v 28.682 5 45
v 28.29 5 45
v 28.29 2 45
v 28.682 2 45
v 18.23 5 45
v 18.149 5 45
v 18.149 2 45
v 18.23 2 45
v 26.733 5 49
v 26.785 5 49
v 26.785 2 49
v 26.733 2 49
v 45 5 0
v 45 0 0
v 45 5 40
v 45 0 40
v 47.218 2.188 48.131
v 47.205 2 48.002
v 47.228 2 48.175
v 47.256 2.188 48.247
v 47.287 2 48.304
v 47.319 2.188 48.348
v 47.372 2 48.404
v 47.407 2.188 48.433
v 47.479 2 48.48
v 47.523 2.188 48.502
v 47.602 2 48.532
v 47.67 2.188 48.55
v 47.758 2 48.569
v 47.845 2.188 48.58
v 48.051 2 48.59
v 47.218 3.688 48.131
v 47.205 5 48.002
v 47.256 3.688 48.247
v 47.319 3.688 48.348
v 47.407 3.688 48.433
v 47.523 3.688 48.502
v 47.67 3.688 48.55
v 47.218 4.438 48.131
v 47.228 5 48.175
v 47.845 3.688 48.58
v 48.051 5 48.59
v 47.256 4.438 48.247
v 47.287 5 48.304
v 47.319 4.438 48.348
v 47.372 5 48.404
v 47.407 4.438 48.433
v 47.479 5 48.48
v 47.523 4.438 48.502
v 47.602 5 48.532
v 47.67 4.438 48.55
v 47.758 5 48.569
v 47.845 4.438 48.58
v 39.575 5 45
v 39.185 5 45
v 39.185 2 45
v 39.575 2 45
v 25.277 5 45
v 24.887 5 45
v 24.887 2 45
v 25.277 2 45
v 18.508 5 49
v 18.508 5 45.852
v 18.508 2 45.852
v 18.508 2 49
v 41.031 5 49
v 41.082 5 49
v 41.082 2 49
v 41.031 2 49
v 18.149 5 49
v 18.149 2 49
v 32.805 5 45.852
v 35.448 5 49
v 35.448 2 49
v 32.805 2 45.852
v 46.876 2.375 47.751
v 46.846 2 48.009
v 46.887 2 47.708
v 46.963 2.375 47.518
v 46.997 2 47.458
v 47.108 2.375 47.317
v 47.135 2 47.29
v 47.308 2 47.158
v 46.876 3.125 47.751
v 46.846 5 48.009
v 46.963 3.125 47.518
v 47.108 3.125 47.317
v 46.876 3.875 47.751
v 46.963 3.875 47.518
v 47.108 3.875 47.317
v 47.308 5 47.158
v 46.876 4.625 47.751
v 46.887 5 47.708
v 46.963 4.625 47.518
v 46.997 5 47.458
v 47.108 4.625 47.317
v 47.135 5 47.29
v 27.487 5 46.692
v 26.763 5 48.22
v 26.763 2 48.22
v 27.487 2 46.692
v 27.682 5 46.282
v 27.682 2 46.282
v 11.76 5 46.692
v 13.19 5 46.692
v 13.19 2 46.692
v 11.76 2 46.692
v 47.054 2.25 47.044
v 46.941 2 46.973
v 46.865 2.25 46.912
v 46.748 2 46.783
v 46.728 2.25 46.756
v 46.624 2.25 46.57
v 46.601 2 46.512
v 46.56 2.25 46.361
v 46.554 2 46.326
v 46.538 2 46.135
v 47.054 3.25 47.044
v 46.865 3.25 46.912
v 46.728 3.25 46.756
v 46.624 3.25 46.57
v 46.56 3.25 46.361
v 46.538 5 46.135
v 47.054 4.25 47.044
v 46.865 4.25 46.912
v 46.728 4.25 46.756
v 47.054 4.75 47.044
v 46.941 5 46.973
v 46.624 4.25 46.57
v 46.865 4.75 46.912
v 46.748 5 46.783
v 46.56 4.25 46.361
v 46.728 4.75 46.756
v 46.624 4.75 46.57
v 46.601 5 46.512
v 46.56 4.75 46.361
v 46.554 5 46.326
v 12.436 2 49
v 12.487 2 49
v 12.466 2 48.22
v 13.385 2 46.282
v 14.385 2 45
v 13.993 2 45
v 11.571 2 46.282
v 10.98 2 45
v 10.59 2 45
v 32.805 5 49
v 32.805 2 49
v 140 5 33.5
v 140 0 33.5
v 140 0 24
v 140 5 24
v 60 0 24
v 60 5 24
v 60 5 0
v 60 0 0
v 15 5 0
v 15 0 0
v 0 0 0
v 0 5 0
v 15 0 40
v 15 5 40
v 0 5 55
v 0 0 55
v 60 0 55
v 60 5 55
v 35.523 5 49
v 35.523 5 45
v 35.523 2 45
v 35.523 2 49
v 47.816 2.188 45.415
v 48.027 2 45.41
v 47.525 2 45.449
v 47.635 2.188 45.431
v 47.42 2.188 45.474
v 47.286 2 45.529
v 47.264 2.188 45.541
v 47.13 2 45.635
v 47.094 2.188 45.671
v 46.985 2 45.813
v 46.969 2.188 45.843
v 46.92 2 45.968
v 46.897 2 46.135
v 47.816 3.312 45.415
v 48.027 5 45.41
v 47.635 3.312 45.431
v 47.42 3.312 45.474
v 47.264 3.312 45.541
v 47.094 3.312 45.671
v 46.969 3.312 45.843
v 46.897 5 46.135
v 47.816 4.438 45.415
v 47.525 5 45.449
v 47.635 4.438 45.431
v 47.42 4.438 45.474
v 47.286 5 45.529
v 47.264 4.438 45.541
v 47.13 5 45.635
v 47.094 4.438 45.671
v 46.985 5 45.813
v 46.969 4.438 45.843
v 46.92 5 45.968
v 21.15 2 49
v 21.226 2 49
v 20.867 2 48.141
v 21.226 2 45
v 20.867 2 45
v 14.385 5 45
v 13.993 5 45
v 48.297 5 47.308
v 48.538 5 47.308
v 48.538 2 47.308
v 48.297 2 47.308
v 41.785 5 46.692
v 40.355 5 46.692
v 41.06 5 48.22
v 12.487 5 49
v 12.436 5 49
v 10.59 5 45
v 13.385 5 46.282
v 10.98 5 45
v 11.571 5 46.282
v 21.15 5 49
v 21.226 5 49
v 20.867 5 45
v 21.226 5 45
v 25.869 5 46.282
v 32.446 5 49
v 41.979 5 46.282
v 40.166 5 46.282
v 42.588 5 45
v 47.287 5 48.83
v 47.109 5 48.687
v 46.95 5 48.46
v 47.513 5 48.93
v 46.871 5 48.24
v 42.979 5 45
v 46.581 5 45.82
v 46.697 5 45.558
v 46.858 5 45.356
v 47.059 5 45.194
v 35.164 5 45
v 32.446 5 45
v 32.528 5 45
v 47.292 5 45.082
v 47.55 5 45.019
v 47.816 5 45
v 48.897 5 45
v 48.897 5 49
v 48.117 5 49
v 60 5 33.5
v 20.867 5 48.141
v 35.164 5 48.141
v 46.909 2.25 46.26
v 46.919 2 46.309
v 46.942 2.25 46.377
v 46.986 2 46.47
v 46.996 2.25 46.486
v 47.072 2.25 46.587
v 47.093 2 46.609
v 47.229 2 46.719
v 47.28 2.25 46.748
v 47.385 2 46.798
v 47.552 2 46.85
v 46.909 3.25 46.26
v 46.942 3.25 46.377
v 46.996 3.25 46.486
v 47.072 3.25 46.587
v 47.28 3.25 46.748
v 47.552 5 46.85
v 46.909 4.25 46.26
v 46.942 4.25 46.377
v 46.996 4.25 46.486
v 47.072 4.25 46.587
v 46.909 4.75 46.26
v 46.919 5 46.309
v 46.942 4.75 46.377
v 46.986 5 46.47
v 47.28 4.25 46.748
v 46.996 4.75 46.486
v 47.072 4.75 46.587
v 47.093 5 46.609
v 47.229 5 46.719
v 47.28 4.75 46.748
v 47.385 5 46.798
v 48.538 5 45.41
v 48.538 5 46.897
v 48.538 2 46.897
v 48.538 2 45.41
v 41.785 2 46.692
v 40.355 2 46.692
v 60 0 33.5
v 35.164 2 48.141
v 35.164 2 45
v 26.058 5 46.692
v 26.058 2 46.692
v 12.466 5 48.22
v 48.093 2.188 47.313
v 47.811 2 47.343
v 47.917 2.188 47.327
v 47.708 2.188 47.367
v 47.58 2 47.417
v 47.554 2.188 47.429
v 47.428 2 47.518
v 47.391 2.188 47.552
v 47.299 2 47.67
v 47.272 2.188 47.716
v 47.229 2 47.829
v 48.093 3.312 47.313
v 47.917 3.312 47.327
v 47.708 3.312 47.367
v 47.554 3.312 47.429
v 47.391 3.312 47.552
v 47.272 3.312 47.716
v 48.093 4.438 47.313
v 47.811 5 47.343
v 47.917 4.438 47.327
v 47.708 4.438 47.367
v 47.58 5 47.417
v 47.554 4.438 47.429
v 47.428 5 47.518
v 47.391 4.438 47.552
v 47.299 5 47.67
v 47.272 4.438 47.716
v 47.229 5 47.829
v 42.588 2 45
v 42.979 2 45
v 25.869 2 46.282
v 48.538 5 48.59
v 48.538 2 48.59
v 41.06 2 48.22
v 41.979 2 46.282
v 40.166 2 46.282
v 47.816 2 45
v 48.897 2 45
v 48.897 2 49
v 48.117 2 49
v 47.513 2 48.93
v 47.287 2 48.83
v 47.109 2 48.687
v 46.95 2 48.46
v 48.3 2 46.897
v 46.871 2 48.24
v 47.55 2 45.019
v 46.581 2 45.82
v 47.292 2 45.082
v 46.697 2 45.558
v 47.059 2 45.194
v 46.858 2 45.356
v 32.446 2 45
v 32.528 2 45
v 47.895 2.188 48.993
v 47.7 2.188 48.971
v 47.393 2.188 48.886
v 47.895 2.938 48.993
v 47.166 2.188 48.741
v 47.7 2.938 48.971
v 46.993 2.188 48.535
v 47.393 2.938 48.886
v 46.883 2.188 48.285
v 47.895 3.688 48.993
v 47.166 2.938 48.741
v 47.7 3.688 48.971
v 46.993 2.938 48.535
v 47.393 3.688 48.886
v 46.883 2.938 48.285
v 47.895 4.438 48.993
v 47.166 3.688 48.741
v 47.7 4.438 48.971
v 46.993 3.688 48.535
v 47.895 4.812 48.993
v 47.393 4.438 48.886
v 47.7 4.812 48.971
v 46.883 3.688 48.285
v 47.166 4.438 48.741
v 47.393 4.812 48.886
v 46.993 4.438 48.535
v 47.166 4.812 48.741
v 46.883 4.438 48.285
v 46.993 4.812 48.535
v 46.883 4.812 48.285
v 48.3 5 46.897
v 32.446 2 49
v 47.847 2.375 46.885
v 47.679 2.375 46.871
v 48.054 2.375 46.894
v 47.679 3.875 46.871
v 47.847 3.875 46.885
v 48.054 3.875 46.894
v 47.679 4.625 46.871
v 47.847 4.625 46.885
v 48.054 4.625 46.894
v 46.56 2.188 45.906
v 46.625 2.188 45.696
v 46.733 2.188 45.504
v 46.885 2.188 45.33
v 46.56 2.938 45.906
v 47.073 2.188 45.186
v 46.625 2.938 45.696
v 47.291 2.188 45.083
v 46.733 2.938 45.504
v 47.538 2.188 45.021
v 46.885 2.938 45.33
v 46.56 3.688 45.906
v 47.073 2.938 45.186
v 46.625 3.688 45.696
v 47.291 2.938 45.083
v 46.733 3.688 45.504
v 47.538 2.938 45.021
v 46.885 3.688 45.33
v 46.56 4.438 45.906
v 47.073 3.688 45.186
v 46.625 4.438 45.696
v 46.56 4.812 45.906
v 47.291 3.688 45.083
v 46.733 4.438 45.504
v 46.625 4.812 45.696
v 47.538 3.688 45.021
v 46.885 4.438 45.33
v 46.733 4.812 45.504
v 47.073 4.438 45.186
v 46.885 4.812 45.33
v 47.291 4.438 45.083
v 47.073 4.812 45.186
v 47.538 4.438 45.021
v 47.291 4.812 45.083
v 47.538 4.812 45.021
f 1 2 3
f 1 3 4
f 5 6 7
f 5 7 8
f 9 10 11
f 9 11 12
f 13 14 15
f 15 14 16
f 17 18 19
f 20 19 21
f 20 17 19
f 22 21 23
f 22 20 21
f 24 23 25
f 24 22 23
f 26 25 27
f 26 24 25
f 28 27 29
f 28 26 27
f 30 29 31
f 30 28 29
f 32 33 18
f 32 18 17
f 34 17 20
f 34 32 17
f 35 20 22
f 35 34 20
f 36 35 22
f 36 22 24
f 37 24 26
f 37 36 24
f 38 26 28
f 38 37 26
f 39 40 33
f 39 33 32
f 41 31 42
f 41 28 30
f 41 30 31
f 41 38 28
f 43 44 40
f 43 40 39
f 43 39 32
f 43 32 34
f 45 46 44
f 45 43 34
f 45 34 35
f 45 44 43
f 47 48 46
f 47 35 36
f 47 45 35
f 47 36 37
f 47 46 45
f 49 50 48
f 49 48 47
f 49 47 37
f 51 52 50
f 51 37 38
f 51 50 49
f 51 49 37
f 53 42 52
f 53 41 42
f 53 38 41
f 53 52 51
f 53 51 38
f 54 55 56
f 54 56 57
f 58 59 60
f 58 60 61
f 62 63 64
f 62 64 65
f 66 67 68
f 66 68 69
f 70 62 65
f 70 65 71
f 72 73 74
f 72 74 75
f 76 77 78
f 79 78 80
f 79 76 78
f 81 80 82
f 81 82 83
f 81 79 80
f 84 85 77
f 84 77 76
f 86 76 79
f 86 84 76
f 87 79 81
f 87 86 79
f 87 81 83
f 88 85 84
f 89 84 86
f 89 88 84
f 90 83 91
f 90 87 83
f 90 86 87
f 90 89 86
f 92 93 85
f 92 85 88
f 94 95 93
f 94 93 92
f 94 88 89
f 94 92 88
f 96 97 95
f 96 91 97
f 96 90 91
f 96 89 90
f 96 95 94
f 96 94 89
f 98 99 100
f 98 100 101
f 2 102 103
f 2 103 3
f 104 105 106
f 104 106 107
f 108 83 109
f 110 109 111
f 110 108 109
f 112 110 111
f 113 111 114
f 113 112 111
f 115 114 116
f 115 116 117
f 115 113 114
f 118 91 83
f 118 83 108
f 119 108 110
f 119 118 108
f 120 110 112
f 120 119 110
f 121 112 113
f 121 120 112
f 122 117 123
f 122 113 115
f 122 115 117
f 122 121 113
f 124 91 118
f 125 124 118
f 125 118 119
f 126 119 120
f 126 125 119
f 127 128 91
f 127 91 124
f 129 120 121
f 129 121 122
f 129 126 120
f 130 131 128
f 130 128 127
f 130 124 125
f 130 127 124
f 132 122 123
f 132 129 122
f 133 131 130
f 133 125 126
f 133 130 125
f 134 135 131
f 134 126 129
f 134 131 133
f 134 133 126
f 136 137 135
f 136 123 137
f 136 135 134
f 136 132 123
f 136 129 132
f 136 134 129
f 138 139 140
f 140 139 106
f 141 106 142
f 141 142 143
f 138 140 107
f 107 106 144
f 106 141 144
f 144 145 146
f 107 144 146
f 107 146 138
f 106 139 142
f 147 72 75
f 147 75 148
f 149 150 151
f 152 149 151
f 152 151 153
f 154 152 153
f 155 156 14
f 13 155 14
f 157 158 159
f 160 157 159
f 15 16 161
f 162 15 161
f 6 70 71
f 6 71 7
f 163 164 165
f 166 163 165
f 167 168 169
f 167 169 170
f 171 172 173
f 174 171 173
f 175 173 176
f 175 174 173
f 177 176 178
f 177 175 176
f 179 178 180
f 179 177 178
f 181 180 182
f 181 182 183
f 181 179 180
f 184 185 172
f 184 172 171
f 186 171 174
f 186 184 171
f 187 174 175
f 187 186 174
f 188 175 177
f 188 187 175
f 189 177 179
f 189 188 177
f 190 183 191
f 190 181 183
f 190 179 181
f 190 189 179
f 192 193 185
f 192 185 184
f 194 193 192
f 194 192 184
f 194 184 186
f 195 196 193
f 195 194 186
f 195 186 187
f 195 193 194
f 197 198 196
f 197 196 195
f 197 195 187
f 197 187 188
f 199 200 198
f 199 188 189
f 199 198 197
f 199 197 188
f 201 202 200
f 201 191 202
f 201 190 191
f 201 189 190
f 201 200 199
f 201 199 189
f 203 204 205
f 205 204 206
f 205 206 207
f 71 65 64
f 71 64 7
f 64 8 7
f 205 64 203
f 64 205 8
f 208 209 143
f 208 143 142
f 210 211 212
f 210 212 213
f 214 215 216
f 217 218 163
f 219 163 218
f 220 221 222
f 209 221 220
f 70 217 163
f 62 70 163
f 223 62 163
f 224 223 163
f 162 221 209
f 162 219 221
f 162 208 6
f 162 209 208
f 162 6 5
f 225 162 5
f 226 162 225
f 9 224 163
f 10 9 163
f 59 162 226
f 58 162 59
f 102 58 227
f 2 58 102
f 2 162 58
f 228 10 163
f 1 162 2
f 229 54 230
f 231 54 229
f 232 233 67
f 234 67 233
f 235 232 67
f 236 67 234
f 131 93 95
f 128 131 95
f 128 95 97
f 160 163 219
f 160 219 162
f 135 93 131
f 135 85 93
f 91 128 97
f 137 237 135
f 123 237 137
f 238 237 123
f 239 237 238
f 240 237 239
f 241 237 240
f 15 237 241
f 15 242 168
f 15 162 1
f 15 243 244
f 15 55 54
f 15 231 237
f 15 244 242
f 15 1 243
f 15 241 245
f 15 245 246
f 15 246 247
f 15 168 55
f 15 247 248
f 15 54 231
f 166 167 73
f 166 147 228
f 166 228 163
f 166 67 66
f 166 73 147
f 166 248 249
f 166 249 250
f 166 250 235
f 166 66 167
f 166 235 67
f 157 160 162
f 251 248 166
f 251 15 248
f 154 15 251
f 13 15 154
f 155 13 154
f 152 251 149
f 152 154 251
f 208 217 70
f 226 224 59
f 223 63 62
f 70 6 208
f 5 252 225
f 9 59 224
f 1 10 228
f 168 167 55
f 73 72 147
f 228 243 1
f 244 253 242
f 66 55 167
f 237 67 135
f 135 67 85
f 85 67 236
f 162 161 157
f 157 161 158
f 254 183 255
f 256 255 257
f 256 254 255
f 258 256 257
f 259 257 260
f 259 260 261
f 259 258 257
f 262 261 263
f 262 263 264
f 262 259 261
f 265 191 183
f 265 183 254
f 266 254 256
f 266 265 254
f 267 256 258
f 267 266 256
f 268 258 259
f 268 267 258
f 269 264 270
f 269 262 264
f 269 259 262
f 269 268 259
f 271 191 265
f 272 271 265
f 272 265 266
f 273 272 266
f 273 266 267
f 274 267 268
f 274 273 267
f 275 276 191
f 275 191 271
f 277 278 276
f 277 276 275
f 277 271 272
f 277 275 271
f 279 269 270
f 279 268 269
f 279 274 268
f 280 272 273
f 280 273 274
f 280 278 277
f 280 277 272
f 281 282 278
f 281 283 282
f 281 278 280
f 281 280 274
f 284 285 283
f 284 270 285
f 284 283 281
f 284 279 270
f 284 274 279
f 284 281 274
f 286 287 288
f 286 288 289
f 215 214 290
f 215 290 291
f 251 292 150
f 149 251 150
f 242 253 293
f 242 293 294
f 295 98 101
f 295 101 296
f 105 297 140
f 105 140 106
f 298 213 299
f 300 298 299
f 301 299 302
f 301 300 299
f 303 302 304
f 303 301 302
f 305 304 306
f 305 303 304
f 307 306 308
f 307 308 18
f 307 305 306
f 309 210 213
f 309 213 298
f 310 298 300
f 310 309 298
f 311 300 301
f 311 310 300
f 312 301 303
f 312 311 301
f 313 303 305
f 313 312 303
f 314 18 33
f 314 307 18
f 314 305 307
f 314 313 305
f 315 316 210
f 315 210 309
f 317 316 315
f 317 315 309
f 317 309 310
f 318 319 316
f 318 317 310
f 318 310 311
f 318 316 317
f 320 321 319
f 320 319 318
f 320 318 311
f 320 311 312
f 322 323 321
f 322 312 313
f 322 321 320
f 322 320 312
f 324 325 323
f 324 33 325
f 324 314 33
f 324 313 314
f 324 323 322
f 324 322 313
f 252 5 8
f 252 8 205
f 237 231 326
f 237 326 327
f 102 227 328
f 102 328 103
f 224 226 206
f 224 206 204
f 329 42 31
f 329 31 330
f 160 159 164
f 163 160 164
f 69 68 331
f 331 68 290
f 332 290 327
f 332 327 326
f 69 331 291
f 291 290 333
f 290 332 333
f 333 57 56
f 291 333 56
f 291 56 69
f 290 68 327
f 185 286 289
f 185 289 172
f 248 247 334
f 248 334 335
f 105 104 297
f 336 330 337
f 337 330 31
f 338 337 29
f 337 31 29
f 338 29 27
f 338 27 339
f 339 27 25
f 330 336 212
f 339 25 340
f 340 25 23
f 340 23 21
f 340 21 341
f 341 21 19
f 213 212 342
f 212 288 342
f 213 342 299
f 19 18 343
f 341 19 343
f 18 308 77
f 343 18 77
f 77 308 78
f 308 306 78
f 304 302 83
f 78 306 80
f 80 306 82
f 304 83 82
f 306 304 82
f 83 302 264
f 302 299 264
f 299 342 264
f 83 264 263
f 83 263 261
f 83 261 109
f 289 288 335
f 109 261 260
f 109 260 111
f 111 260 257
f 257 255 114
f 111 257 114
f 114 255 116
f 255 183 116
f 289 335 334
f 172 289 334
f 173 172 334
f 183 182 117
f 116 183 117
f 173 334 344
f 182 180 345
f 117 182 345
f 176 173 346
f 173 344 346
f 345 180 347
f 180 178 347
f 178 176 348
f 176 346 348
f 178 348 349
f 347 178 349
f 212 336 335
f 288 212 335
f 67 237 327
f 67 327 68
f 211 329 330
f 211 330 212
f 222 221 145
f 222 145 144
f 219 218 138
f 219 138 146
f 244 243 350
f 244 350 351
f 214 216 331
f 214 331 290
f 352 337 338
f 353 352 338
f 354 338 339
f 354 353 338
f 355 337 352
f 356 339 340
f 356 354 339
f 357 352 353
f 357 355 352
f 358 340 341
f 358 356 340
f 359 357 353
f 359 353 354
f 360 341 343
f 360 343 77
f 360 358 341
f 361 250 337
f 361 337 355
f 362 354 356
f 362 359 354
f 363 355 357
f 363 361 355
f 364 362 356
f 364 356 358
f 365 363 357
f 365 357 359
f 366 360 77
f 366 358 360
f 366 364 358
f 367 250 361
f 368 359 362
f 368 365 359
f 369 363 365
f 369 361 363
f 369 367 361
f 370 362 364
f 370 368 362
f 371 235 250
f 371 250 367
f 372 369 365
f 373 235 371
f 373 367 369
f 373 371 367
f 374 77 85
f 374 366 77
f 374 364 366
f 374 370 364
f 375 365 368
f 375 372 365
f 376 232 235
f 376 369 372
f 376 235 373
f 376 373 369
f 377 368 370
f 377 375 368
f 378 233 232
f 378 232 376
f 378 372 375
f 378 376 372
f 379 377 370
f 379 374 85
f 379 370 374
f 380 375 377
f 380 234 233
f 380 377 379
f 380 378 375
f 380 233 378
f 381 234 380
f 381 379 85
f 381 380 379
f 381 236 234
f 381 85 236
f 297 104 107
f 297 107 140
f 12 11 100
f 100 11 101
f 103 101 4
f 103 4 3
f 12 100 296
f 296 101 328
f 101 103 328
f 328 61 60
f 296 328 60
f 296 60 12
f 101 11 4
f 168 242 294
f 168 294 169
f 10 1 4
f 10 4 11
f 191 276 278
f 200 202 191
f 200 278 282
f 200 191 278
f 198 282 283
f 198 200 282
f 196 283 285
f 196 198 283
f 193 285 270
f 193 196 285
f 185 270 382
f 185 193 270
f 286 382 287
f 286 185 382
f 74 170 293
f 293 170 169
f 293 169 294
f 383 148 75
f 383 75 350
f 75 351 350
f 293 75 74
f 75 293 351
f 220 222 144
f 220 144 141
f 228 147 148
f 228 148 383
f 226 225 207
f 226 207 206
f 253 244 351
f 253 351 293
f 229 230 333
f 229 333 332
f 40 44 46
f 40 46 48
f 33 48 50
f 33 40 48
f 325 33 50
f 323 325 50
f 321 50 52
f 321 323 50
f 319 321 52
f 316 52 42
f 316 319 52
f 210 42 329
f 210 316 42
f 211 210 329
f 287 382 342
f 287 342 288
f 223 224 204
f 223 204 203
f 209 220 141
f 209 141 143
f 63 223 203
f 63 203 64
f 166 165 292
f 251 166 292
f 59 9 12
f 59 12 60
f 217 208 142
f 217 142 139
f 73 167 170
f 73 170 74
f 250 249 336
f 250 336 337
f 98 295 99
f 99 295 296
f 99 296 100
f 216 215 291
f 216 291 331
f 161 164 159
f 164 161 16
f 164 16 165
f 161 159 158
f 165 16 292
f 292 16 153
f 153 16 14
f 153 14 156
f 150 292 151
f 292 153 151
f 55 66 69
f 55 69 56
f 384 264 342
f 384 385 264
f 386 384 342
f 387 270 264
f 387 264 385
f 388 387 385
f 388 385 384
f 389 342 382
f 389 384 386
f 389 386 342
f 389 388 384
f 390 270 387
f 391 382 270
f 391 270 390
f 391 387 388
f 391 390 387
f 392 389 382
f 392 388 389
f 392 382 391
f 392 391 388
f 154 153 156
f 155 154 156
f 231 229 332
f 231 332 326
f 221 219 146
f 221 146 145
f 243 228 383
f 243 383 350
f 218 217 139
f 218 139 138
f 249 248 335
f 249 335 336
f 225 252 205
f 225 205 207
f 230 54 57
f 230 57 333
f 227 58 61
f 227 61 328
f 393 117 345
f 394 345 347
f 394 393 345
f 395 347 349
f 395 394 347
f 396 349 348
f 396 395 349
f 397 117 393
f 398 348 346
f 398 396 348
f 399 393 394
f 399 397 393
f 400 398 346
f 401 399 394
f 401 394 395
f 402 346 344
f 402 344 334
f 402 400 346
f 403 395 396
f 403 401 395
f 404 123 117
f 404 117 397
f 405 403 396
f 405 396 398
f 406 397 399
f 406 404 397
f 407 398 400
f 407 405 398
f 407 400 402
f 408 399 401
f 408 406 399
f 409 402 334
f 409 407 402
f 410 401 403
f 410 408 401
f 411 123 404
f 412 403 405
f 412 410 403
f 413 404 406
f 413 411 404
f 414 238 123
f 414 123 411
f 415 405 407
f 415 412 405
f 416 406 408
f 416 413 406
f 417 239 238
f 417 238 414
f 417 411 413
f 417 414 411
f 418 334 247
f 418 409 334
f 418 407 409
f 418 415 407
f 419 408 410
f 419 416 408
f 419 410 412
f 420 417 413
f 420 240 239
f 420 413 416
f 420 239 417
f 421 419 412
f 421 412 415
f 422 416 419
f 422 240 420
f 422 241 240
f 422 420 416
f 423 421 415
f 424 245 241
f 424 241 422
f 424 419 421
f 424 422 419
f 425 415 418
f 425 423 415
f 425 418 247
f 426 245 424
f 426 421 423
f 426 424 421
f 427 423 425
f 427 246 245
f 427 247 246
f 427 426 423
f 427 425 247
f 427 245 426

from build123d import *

# Parameters (mm, degrees)
BOSS_EXTRUDE1_DEPTH = 5
CUT_EXTRUDE1_DEPTH  = 3


with BuildPart() as part:
    # Sketch1 → Boss-Extrude1 (new body)
    with BuildSketch(Plane(origin=(0, 0, 0), x_dir=(1, 0, 0), z_dir=(0, 1, 0))):
        Polygon((0, -55), (60, -55), (60, -33.5), (140, -33.5), (140, -24), (60, -24), (60, 0), (45, 0), (45, -40), (15, -40), (15, 0), (0, 0), align=None)
    extrude(amount=BOSS_EXTRUDE1_DEPTH)

    # Sketch4 → Cut-Extrude1 (cut)
    # profile 1 of 6: a face of its own
    with BuildSketch(Plane(origin=(0, 5, 0), x_dir=(1, 0, 0), z_dir=(0, 1, 0))):
        Polygon((12.435897436, -49), (10.58974359, -45), (10.979967949, -45), (11.571314103, -46.282051282), (13.384615385, -46.282051282), (13.992788462, -45), (14.384615385, -45), (12.487179487, -49), align=None)
        Polygon((12.465544872, -48.220352564), (13.189903846, -46.692307692), (11.760416667, -46.692307692), align=None, mode=Mode.SUBTRACT)
    # profile 2 of 6: a face of its own
    with BuildSketch(Plane(origin=(0, 5, 0), x_dir=(1, 0, 0), z_dir=(0, 1, 0))):
        Polygon((21.225641026, -45), (21.225641026, -49), (21.150320513, -49), (18.507692308, -45.851762821), (18.507692308, -49), (18.148717949, -49), (18.148717949, -45), (18.230448718, -45), (20.866666667, -48.141025641), (20.866666667, -45), align=None)
    # profile 3 of 6: a face of its own
    with BuildSketch(Plane(origin=(0, 5, 0), x_dir=(1, 0, 0), z_dir=(0, 1, 0))):
        Polygon((26.733333333, -49), (24.887179487, -45), (25.277403846, -45), (25.86875, -46.282051282), (27.682051282, -46.282051282), (28.290224359, -45), (28.682051282, -45), (26.784615385, -49), align=None)
        Polygon((26.762980769, -48.220352564), (27.487339744, -46.692307692), (26.057852564, -46.692307692), align=None, mode=Mode.SUBTRACT)
    # profile 4 of 6: a face of its own
    with BuildSketch(Plane(origin=(0, 5, 0), x_dir=(1, 0, 0), z_dir=(0, 1, 0))):
        Polygon((35.523076923, -45), (35.523076923, -49), (35.44775641, -49), (32.805128205, -45.851762821), (32.805128205, -49), (32.446153846, -49), (32.446153846, -45), (32.527884615, -45), (35.164102564, -48.141025641), (35.164102564, -45), align=None)
    # profile 5 of 6: a face of its own
    with BuildSketch(Plane(origin=(0, 5, 0), x_dir=(1, 0, 0), z_dir=(0, 1, 0))):
        Polygon((41.030769231, -49), (39.184615385, -45), (39.574839744, -45), (40.166185897, -46.282051282), (41.979487179, -46.282051282), (42.587660256, -45), (42.979487179, -45), (41.082051282, -49), align=None)
        Polygon((41.060416667, -48.220352564), (41.784775641, -46.692307692), (40.355288462, -46.692307692), align=None, mode=Mode.SUBTRACT)
    # profile 6 of 6: a face of its own
    with BuildSketch(Plane(origin=(0, 5, 0), x_dir=(1, 0, 0), z_dir=(0, 1, 0))):
        with BuildLine():
            Line((48.897435897, -49), (48.116987179, -49))
            add(Edge.make_bspline(
                [(48.116987179, -49), (48.078782602, -48.999802304), (48.004732622, -48.999419121), (47.897061448, -48.993338284), (47.7961773, -48.985254385), (47.702258451, -48.97169408), (47.614693787, -48.957633832), (47.534372273, -48.936996754), (47.460621116, -48.91420235), (47.372061071, -48.879130066), (47.271577566, -48.824662366), (47.163576599, -48.743881592), (47.06969557, -48.647031967), (46.989868866, -48.536664179), (46.925806239, -48.415247106), (46.880046085, -48.285393075), (46.85064802, -48.149286724), (46.847662619, -48.055973237), (46.846153846, -48.008814103)],
                knots=[0, 0, 0, 0, 1.00128172, 1.940733171, 2.826250472, 3.653024905, 4.427672124, 5.149348099, 5.824709082, 6.450061444, 7.643590664, 8.808605388, 9.972104426, 11.165284501, 12.367876273, 13.557044126, 14.765369432, 16, 16, 16, 16], degree=3))
            add(Edge.make_bspline(
                [(46.846153846, -48.008814103), (46.847386233, -47.964634112), (46.84980799, -47.877816264), (46.873466598, -47.751260803), (46.909178693, -47.630411683), (46.960713415, -47.516433521), (47.026424516, -47.410327841), (47.106371945, -47.313904536), (47.201167683, -47.22905671), (47.272340847, -47.181837688), (47.30849359, -47.157852564)],
                knots=[0, 0, 0, 0, 1.044356178, 2.052258378, 3.035953355, 4.020338374, 5.002448483, 5.980768927, 6.974322109, 8, 8, 8, 8], degree=3))
            add(Edge.make_bspline(
                [(47.30849359, -47.157852564), (47.263049876, -47.140414673), (47.176104795, -47.107051668), (47.056302302, -47.047837808), (46.953049503, -46.983927334), (46.86501575, -46.9148518), (46.791249685, -46.838355693), (46.725535913, -46.756453592), (46.669766654, -46.666293122), (46.622183034, -46.56982802), (46.584489246, -46.467569127), (46.558324516, -46.360281463), (46.54173076, -46.249180208), (46.539560824, -46.173670002), (46.538461538, -46.135416667)],
                knots=[0, 0, 0, 0, 1.272200328, 2.434034374, 3.488177493, 4.442517805, 5.351202203, 6.260825393, 7.183200622, 8.11705787, 9.069326169, 10.026320267, 11.000137371, 12, 12, 12, 12], degree=3))
            add(Edge.make_bspline(
                [(46.538461538, -46.135416667), (46.539578041, -46.096368878), (46.541774791, -46.019541259), (46.557978943, -45.90667732), (46.585423547, -45.798823648), (46.623198448, -45.695262323), (46.672439932, -45.596599873), (46.731928763, -45.502060921), (46.803327906, -45.413046548), (46.883730364, -45.328265046), (46.973436376, -45.250736025), (47.072285382, -45.184110133), (47.177743985, -45.126562612), (47.291256316, -45.080297632), (47.412016926, -45.044080616), (47.540054106, -45.019040231), (47.675295151, -45.002100252), (47.768107642, -45.000711963), (47.815705128, -45)],
                knots=[0, 0, 0, 0, 0.978522333, 1.925270105, 2.85076145, 3.763600118, 4.682725947, 5.609499657, 6.557784645, 7.537954401, 8.534920712, 9.522742111, 10.520247711, 11.5409147, 12.58930695, 13.675078472, 14.807699069, 16, 16, 16, 16], degree=3))
            Line((47.815705128, -45), (48.897435897, -45))
            Line((48.897435897, -45), (48.897435897, -49))
        make_face()
        with BuildLine():
            Line((48.538461538, -48.58974359), (48.538461538, -47.307692308))
            Line((48.538461538, -47.307692308), (48.297275641, -47.307692308))
            add(Edge.make_bspline(
                [(48.297275641, -47.307692308), (48.262019557, -47.308145559), (48.193897619, -47.309021333), (48.094984144, -47.311609081), (48.003398634, -47.318537578), (47.918825519, -47.32586562), (47.841831582, -47.337149257), (47.772159281, -47.350957405), (47.709182048, -47.365432661), (47.636590639, -47.390121207), (47.554259533, -47.426226355), (47.46710675, -47.483630694), (47.388665327, -47.550092509), (47.323955681, -47.628926607), (47.270082552, -47.714060303), (47.233811866, -47.806128442), (47.208522595, -47.901958331), (47.206271259, -47.968047579), (47.205128205, -48.001602564)],
                knots=[0, 0, 0, 0, 1.156584208, 2.234756387, 3.244705828, 4.168772894, 5.018724976, 5.795346628, 6.498686023, 7.135894168, 8.308330183, 9.43588092, 10.547699294, 11.667188675, 12.76860303, 13.837480448, 14.902040606, 16, 16, 16, 16], degree=3))
            add(Edge.make_bspline(
                [(47.205128205, -48.001602564), (47.205685691, -48.023816697), (47.20677926, -48.067392143), (47.217088766, -48.130879067), (47.231315761, -48.191293527), (47.25477962, -48.247006859), (47.282578229, -48.299975385), (47.318209405, -48.34852593), (47.359295429, -48.393973734), (47.407196584, -48.435100612), (47.461717059, -48.472297499), (47.524583935, -48.503262131), (47.594088014, -48.530780023), (47.671678673, -48.551639229), (47.755810377, -48.569748341), (47.847766678, -48.581167846), (47.946993383, -48.588503916), (48.015743783, -48.589321148), (48.051282051, -48.58974359)],
                knots=[0, 0, 0, 0, 0.911412742, 1.787835618, 2.63643285, 3.453173233, 4.262886967, 5.08783453, 5.918594724, 6.773969545, 7.67442701, 8.62112486, 9.645634318, 10.739428598, 11.916091468, 13.177237585, 14.540865421, 16, 16, 16, 16], degree=3))
            Line((48.051282051, -48.58974359), (48.538461538, -48.58974359))
        make_face(mode=Mode.SUBTRACT)
        with BuildLine():
            Line((48.538461538, -46.897435897), (48.538461538, -45.41025641))
            Line((48.538461538, -45.41025641), (48.02724359, -45.41025641))
            add(Edge.make_bspline(
                [(48.02724359, -45.41025641), (47.99065419, -45.41073715), (47.920132945, -45.411663713), (47.818234921, -45.41386232), (47.724292741, -45.422019142), (47.63752424, -45.429839399), (47.558330886, -45.442615415), (47.485942388, -45.454987006), (47.422012134, -45.473192413), (47.347210045, -45.498243376), (47.26354466, -45.538278135), (47.172178111, -45.597152678), (47.091703188, -45.66886621), (47.023425854, -45.751440271), (46.966656245, -45.84029687), (46.927382886, -45.935610894), (46.901935986, -46.034198698), (46.898938947, -46.101609423), (46.897435897, -46.135416667)],
                knots=[0, 0, 0, 0, 1.16016216, 2.236059617, 3.229676189, 4.14889023, 4.996733752, 5.772278665, 6.474820656, 7.101410824, 8.271817372, 9.403828207, 10.537358096, 11.673541442, 12.791884111, 13.865947414, 14.929748409, 16, 16, 16, 16], degree=3))
            add(Edge.make_bspline(
                [(46.897435897, -46.135416667), (46.897742716, -46.156555083), (46.898351404, -46.198490951), (46.907919371, -46.260062814), (46.921197263, -46.320001273), (46.940765146, -46.377492166), (46.964436964, -46.433525476), (46.995666123, -46.486277982), (47.030892383, -46.537995275), (47.085452532, -46.604147419), (47.165892911, -46.679445819), (47.280241748, -46.752246439), (47.409533392, -46.811908817), (47.503528097, -46.837131085), (47.552083333, -46.850160256)],
                knots=[0, 0, 0, 0, 0.723354195, 1.435040621, 2.129761981, 2.824182007, 3.512608497, 4.209435533, 4.920062464, 5.654614313, 7.143585817, 8.671381114, 10.280521501, 12, 12, 12, 12], degree=3))
            add(Edge.make_bspline(
                [(47.552083333, -46.850160256), (47.571545139, -46.854109189), (47.613742348, -46.86267129), (47.682551361, -46.871703561), (47.76137005, -46.879805803), (47.849861531, -46.88564168), (47.948377746, -46.891906393), (48.056887045, -46.894256042), (48.175466139, -46.897123913), (48.257743237, -46.897329242), (48.300480769, -46.897435897)],
                knots=[0, 0, 0, 0, 0.634452549, 1.375623993, 2.216454381, 3.166361212, 4.209414599, 5.370755378, 6.634280627, 8, 8, 8, 8], degree=3))
            Line((48.300480769, -46.897435897), (48.538461538, -46.897435897))
        make_face(mode=Mode.SUBTRACT)
    extrude(amount=-CUT_EXTRUDE1_DEPTH, mode=Mode.SUBTRACT)


solid = part.part
